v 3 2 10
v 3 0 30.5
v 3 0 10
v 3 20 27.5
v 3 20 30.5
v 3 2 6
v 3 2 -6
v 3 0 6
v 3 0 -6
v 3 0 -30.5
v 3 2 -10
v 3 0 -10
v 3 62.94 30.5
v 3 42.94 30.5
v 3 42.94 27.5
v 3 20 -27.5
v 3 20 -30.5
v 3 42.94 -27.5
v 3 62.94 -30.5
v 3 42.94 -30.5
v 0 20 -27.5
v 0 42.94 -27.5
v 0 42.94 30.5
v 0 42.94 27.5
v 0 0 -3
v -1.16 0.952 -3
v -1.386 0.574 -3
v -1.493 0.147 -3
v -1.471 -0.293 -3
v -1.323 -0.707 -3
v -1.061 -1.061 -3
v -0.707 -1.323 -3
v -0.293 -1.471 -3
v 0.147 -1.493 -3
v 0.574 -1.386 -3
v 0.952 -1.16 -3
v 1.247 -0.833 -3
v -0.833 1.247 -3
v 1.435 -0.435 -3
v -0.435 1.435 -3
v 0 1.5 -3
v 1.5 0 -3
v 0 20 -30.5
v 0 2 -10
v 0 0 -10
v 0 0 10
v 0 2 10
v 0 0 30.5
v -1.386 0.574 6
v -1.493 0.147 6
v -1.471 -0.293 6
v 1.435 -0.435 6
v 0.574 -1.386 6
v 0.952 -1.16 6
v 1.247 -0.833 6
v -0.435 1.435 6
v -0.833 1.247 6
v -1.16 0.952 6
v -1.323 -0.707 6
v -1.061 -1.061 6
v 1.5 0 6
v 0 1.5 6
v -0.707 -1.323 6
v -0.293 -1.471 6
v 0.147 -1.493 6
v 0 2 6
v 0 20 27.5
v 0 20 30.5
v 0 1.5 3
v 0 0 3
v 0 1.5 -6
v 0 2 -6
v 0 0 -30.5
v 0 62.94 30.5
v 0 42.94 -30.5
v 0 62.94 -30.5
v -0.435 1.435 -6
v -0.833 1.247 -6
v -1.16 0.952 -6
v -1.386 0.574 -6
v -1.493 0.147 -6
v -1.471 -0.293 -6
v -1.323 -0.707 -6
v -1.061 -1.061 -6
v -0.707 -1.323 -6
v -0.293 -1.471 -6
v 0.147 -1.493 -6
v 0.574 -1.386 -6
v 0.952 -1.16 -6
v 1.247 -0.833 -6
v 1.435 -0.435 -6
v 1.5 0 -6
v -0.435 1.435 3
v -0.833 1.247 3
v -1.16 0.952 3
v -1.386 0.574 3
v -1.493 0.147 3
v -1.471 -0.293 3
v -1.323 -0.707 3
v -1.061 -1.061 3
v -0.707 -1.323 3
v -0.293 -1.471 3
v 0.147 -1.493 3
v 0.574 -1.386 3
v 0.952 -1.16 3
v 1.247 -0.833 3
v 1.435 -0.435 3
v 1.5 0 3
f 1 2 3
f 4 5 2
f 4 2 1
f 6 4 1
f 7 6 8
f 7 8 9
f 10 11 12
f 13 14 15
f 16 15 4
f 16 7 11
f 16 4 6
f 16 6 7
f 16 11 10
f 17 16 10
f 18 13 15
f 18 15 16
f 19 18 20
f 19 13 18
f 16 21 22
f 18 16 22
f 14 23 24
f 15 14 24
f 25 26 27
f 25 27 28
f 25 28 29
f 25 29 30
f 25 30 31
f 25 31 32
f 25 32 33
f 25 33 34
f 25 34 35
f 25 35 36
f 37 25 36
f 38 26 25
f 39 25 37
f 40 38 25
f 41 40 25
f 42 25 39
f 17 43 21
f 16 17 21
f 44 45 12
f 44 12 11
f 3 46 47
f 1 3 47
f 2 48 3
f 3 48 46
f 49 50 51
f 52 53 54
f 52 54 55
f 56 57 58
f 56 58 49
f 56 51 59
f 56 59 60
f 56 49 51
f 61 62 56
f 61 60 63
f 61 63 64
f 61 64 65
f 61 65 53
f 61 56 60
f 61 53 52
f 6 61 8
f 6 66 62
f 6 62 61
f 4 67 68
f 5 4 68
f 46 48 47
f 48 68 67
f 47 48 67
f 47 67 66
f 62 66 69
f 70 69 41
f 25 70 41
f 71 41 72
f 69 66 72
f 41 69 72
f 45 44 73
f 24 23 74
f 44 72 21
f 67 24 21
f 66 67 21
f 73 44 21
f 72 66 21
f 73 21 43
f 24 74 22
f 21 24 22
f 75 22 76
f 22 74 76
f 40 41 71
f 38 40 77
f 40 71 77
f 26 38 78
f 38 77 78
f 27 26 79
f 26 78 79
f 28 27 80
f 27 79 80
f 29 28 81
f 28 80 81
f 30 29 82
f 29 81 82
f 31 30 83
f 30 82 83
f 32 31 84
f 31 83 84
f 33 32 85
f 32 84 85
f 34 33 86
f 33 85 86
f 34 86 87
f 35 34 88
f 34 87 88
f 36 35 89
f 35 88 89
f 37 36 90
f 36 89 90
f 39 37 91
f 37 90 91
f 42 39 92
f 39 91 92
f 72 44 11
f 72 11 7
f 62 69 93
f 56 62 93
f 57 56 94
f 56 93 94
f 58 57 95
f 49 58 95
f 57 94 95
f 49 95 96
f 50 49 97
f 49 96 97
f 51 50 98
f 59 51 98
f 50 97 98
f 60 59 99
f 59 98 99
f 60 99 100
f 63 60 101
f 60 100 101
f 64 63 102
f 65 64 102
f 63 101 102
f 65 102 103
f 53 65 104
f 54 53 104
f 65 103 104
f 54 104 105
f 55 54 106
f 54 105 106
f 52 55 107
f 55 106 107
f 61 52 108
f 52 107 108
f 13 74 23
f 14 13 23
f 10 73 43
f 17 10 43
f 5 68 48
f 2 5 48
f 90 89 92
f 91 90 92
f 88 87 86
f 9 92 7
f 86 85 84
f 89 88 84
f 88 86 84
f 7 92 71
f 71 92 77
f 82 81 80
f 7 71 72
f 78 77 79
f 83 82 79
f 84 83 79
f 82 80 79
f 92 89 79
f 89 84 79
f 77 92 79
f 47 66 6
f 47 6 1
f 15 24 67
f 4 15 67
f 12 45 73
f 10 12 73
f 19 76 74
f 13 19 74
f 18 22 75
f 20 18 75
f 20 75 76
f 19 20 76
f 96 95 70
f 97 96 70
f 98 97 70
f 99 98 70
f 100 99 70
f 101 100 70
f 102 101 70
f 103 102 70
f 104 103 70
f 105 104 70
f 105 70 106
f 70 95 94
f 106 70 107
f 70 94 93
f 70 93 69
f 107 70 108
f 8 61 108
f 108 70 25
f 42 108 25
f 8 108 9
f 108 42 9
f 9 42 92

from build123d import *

# Parameters (mm, degrees)
BOSS_EXTRUDE1_DEPTH = 3
SKETCH4_R           = 1.5
BOSS_EXTRUDE2_DEPTH = 3
SKETCH5_W           = 4
SKETCH5_H           = 2
CUT_EXTRUDE1_DEPTH  = 10
LPATTERN1_COUNT     = 2
LPATTERN1_PITCH     = 9


with BuildPart() as part:
    # Sketch1 → Boss-Extrude1 (new body)
    with BuildSketch(Plane(origin=(0, 0, 0), x_dir=(0, 0, -1), z_dir=(1, 0, 0))):
        Polygon((-27.5, 0), (27.5, 0), (30.5, 0), (30.5, 20), (27.5, 20), (27.5, 42.94), (30.5, 42.94), (30.5, 62.94), (27.5, 62.94), (-27.5, 62.94), (-30.5, 62.94), (-30.5, 42.94), (-27.5, 42.94), (-27.5, 20), (-30.5, 20), (-30.5, 0), align=None)
    extrude(amount=BOSS_EXTRUDE1_DEPTH)

    # Sketch4 → Boss-Extrude2 (add)
    with BuildSketch(Plane.XY.offset(3)):
        Circle(SKETCH4_R)
    boss_extrude2 = extrude(amount=BOSS_EXTRUDE2_DEPTH)

    # Sketch5 → Cut-Extrude1 (cut)
    with BuildSketch(Plane.ZY):
        with Locations((-8, 1)):
            Rectangle(SKETCH5_W, SKETCH5_H)
        with Locations((8, 1)):
            Rectangle(SKETCH5_W, SKETCH5_H)
    extrude(amount=-CUT_EXTRUDE1_DEPTH, mode=Mode.SUBTRACT)

    # LPattern1: Boss-Extrude2 ×2
    with Locations(*[(0, 0, -i * LPATTERN1_PITCH) for i in range(1, LPATTERN1_COUNT)]):
        add(boss_extrude2)


solid = part.part
